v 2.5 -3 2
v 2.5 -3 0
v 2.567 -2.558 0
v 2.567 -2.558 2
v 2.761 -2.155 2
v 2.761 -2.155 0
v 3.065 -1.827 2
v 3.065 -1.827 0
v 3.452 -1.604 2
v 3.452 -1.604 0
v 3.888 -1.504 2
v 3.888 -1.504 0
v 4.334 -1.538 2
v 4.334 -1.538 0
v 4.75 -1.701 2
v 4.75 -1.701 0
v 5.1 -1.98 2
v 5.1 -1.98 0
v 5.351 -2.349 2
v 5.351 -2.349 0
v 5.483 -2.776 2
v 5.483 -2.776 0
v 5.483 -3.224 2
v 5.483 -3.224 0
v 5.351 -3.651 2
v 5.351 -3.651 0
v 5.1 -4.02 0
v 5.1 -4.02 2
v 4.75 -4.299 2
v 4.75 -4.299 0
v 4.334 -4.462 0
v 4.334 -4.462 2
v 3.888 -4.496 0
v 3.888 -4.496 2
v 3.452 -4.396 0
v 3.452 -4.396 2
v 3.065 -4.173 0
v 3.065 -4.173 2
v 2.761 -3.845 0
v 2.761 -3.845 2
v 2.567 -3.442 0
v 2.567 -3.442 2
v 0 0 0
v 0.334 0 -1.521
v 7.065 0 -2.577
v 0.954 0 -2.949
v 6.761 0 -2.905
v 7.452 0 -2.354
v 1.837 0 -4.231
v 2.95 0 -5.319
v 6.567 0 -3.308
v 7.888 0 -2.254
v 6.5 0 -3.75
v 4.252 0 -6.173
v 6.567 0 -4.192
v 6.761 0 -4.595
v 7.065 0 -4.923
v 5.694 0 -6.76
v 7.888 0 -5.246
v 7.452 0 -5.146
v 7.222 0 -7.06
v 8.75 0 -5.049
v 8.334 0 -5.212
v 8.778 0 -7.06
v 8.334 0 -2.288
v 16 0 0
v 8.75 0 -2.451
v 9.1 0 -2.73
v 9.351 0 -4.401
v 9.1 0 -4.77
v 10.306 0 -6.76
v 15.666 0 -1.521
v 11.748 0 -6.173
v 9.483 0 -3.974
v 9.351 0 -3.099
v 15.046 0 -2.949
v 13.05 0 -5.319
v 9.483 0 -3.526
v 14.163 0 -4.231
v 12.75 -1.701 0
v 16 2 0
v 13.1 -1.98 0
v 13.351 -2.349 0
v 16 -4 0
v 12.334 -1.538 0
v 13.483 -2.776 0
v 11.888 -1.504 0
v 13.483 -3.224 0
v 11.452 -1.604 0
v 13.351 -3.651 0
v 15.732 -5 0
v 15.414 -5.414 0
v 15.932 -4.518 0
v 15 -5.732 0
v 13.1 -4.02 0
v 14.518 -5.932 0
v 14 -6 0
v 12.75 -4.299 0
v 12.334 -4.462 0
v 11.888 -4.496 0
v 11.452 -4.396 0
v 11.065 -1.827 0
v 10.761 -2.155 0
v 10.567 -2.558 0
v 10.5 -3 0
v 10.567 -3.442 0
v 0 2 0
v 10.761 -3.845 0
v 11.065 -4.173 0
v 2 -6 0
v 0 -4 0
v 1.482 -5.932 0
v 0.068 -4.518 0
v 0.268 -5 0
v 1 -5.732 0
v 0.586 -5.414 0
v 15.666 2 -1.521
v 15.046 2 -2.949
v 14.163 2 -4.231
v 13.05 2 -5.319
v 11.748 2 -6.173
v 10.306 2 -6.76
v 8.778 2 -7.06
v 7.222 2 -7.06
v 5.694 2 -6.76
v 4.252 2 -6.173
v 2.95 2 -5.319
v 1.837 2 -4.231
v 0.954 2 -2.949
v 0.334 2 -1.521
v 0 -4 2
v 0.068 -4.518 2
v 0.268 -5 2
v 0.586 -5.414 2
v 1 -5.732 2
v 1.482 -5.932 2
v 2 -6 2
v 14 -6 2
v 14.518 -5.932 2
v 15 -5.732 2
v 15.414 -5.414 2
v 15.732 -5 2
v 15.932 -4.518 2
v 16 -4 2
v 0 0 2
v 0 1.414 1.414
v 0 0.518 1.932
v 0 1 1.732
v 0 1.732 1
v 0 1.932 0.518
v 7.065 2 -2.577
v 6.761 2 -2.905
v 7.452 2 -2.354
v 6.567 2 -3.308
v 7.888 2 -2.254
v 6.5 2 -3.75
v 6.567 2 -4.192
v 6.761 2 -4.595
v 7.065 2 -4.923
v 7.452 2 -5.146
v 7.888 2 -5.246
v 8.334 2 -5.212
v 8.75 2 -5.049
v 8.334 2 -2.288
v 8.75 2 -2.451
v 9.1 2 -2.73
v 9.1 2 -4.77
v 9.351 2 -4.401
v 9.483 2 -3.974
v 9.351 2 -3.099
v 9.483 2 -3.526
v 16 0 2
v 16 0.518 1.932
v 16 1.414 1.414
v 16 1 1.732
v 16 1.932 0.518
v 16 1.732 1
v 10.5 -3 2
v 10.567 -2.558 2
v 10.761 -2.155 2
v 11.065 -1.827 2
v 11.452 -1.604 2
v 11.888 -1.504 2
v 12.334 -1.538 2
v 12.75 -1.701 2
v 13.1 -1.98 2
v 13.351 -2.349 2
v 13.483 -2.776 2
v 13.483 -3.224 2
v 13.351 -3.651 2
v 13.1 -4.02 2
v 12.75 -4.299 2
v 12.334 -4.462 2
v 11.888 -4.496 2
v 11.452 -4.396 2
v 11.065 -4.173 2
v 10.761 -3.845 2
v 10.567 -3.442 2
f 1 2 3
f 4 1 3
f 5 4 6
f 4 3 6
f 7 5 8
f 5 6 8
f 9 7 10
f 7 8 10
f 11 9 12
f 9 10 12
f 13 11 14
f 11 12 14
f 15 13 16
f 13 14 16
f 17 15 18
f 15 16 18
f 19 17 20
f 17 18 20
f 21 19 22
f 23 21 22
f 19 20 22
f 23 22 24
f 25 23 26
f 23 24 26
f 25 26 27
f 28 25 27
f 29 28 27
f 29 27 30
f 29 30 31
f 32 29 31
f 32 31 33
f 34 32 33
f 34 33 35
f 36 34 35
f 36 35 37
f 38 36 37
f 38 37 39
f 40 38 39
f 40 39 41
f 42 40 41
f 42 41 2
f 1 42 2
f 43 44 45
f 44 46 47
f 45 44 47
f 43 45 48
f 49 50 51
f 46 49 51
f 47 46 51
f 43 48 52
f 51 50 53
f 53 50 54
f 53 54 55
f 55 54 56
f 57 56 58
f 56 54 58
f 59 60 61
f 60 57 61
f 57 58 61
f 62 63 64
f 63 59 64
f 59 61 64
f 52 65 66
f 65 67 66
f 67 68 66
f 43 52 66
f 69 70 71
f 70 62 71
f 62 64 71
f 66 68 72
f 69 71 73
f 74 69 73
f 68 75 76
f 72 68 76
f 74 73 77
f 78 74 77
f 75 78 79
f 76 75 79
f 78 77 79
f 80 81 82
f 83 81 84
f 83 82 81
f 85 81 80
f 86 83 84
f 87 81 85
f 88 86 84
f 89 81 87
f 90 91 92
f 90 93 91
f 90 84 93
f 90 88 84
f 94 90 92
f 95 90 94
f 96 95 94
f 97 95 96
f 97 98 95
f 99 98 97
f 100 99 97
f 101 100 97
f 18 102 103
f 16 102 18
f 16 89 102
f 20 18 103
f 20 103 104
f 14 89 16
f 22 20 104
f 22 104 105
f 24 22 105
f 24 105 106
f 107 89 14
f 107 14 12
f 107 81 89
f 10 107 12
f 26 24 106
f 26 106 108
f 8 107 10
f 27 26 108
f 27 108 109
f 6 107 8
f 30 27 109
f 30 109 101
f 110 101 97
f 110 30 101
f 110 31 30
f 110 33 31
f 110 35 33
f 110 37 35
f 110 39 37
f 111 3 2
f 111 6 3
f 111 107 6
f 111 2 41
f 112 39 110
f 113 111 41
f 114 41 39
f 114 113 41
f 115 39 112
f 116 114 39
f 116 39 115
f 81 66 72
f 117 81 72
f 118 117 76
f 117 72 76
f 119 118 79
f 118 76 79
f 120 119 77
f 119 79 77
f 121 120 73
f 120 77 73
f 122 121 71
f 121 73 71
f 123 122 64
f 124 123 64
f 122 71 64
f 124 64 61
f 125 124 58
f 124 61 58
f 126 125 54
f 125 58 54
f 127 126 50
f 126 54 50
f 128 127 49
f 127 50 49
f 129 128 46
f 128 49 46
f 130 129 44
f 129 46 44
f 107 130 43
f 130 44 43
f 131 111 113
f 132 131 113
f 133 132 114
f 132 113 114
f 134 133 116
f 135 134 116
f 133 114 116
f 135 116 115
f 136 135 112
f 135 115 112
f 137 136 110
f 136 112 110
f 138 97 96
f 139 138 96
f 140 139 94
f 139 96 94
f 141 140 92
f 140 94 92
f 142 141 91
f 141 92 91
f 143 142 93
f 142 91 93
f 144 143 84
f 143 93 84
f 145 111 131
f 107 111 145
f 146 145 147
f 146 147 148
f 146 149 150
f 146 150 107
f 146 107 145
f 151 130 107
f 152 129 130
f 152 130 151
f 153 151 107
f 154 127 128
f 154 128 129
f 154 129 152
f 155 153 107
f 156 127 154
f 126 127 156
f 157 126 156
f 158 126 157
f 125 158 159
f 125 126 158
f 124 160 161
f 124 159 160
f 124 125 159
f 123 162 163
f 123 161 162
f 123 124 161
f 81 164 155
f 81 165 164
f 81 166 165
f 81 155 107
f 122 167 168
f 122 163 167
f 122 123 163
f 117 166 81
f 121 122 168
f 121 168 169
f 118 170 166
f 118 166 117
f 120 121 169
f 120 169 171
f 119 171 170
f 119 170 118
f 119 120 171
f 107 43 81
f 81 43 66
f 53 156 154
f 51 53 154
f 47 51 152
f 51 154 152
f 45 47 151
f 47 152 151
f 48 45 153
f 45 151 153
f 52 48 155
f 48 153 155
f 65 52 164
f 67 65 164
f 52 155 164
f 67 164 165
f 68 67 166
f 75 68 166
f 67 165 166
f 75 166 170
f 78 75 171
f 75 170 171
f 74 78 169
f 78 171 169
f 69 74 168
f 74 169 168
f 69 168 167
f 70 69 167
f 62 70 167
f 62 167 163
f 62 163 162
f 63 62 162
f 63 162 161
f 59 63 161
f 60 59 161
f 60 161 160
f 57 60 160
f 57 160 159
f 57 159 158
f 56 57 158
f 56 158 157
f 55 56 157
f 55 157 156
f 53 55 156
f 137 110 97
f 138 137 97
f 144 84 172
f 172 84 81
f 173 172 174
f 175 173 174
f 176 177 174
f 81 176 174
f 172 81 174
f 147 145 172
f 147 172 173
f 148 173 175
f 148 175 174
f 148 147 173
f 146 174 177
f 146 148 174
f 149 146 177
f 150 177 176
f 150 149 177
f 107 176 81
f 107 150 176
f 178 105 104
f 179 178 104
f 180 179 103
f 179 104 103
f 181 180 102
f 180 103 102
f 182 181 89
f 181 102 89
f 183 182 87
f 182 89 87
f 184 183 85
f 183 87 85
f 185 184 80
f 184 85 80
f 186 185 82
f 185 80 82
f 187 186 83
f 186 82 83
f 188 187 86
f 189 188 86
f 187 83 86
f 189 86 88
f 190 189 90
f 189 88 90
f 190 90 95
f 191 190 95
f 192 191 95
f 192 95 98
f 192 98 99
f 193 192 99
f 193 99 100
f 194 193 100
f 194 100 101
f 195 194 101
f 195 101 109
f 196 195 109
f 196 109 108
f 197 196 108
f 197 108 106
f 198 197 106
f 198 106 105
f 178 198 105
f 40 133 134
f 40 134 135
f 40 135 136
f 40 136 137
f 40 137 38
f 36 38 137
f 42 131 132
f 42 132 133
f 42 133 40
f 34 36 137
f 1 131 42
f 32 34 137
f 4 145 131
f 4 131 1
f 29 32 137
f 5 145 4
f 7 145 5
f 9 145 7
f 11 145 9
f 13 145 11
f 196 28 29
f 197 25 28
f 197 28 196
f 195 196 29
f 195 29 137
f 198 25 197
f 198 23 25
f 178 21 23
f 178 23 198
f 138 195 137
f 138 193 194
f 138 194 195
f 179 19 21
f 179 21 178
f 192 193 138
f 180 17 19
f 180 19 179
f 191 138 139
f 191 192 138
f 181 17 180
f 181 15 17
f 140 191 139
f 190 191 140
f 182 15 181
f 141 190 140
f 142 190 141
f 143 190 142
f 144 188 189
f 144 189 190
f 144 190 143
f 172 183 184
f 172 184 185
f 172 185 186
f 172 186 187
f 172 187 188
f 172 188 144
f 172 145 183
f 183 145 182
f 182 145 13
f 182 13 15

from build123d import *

# Parameters (mm, degrees)
BOSS_EXTRUDE1_DEPTH = 2
BOSS_EXTRUDE2_DEPTH = 2
BOSS_EXTRUDE3_DEPTH = 16
SKETCH10_R          = 1.5
CUT_EXTRUDE1_DEPTH  = 19.503375178
SKETCH13_R          = 1.5
CUT_EXTRUDE2_DEPTH  = 4


with BuildPart() as part:
    # Sketch1 → Boss-Extrude1 (new body)
    with BuildSketch(Plane.XY):
        with BuildLine():
            Line((0, 0), (0, -4))
            ThreePointArc((0, -4), (0.585786438, -5.414213562), (2, -6))
            Line((2, -6), (14, -6))
            ThreePointArc((14, -6), (15.414213562, -5.414213562), (16, -4))
            Line((16, -4), (16, 0))
            Line((16, 0), (0, 0))
        make_face()
    extrude(amount=BOSS_EXTRUDE1_DEPTH)

    # Sketch9 → Boss-Extrude3 (add)
    with BuildSketch(Plane.ZY):
        with BuildLine():
            Line((0, 2), (0, 0))
            Line((0, 0), (2, 0))
            ThreePointArc((2, 0), (1.414213562, 1.414213562), (0, 2))
        make_face()
    extrude(amount=-BOSS_EXTRUDE3_DEPTH)

    # Sketch10 → Cut-Extrude1 (cut, through all)
    with BuildSketch(Plane(origin=(0, 0, 0), x_dir=(-1, 0, 0), z_dir=(0, 0, -1))):
        with Locations((-12, -3)):
            Circle(SKETCH10_R)
        with Locations((-4, -3)):
            Circle(SKETCH10_R)
    extrude(amount=-CUT_EXTRUDE1_DEPTH, mode=Mode.SUBTRACT)


with BuildPart() as body_2:
    # Sketch5 → Boss-Extrude2 (new body)
    with BuildSketch(Plane(origin=(0, 0, 0), x_dir=(1, 0, 0), z_dir=(0, 1, 0))):
        with BuildLine():
            Line((0, 0), (16, 0))
            ThreePointArc((16, 0), (8, 7.097527245), (0, 0))
        make_face()
    extrude(amount=BOSS_EXTRUDE2_DEPTH)

    # Sketch13 → Cut-Extrude2 (cut)
    with BuildSketch(Plane(origin=(0, 2, 0), x_dir=(1, 0, 0), z_dir=(0, 1, 0))):
        with Locations(Location((8, 3.75, 0), (0, 0, 180))):
            Circle(SKETCH13_R)
    extrude(amount=-CUT_EXTRUDE2_DEPTH, mode=Mode.SUBTRACT)


solid = Compound([part.part, body_2.part])
